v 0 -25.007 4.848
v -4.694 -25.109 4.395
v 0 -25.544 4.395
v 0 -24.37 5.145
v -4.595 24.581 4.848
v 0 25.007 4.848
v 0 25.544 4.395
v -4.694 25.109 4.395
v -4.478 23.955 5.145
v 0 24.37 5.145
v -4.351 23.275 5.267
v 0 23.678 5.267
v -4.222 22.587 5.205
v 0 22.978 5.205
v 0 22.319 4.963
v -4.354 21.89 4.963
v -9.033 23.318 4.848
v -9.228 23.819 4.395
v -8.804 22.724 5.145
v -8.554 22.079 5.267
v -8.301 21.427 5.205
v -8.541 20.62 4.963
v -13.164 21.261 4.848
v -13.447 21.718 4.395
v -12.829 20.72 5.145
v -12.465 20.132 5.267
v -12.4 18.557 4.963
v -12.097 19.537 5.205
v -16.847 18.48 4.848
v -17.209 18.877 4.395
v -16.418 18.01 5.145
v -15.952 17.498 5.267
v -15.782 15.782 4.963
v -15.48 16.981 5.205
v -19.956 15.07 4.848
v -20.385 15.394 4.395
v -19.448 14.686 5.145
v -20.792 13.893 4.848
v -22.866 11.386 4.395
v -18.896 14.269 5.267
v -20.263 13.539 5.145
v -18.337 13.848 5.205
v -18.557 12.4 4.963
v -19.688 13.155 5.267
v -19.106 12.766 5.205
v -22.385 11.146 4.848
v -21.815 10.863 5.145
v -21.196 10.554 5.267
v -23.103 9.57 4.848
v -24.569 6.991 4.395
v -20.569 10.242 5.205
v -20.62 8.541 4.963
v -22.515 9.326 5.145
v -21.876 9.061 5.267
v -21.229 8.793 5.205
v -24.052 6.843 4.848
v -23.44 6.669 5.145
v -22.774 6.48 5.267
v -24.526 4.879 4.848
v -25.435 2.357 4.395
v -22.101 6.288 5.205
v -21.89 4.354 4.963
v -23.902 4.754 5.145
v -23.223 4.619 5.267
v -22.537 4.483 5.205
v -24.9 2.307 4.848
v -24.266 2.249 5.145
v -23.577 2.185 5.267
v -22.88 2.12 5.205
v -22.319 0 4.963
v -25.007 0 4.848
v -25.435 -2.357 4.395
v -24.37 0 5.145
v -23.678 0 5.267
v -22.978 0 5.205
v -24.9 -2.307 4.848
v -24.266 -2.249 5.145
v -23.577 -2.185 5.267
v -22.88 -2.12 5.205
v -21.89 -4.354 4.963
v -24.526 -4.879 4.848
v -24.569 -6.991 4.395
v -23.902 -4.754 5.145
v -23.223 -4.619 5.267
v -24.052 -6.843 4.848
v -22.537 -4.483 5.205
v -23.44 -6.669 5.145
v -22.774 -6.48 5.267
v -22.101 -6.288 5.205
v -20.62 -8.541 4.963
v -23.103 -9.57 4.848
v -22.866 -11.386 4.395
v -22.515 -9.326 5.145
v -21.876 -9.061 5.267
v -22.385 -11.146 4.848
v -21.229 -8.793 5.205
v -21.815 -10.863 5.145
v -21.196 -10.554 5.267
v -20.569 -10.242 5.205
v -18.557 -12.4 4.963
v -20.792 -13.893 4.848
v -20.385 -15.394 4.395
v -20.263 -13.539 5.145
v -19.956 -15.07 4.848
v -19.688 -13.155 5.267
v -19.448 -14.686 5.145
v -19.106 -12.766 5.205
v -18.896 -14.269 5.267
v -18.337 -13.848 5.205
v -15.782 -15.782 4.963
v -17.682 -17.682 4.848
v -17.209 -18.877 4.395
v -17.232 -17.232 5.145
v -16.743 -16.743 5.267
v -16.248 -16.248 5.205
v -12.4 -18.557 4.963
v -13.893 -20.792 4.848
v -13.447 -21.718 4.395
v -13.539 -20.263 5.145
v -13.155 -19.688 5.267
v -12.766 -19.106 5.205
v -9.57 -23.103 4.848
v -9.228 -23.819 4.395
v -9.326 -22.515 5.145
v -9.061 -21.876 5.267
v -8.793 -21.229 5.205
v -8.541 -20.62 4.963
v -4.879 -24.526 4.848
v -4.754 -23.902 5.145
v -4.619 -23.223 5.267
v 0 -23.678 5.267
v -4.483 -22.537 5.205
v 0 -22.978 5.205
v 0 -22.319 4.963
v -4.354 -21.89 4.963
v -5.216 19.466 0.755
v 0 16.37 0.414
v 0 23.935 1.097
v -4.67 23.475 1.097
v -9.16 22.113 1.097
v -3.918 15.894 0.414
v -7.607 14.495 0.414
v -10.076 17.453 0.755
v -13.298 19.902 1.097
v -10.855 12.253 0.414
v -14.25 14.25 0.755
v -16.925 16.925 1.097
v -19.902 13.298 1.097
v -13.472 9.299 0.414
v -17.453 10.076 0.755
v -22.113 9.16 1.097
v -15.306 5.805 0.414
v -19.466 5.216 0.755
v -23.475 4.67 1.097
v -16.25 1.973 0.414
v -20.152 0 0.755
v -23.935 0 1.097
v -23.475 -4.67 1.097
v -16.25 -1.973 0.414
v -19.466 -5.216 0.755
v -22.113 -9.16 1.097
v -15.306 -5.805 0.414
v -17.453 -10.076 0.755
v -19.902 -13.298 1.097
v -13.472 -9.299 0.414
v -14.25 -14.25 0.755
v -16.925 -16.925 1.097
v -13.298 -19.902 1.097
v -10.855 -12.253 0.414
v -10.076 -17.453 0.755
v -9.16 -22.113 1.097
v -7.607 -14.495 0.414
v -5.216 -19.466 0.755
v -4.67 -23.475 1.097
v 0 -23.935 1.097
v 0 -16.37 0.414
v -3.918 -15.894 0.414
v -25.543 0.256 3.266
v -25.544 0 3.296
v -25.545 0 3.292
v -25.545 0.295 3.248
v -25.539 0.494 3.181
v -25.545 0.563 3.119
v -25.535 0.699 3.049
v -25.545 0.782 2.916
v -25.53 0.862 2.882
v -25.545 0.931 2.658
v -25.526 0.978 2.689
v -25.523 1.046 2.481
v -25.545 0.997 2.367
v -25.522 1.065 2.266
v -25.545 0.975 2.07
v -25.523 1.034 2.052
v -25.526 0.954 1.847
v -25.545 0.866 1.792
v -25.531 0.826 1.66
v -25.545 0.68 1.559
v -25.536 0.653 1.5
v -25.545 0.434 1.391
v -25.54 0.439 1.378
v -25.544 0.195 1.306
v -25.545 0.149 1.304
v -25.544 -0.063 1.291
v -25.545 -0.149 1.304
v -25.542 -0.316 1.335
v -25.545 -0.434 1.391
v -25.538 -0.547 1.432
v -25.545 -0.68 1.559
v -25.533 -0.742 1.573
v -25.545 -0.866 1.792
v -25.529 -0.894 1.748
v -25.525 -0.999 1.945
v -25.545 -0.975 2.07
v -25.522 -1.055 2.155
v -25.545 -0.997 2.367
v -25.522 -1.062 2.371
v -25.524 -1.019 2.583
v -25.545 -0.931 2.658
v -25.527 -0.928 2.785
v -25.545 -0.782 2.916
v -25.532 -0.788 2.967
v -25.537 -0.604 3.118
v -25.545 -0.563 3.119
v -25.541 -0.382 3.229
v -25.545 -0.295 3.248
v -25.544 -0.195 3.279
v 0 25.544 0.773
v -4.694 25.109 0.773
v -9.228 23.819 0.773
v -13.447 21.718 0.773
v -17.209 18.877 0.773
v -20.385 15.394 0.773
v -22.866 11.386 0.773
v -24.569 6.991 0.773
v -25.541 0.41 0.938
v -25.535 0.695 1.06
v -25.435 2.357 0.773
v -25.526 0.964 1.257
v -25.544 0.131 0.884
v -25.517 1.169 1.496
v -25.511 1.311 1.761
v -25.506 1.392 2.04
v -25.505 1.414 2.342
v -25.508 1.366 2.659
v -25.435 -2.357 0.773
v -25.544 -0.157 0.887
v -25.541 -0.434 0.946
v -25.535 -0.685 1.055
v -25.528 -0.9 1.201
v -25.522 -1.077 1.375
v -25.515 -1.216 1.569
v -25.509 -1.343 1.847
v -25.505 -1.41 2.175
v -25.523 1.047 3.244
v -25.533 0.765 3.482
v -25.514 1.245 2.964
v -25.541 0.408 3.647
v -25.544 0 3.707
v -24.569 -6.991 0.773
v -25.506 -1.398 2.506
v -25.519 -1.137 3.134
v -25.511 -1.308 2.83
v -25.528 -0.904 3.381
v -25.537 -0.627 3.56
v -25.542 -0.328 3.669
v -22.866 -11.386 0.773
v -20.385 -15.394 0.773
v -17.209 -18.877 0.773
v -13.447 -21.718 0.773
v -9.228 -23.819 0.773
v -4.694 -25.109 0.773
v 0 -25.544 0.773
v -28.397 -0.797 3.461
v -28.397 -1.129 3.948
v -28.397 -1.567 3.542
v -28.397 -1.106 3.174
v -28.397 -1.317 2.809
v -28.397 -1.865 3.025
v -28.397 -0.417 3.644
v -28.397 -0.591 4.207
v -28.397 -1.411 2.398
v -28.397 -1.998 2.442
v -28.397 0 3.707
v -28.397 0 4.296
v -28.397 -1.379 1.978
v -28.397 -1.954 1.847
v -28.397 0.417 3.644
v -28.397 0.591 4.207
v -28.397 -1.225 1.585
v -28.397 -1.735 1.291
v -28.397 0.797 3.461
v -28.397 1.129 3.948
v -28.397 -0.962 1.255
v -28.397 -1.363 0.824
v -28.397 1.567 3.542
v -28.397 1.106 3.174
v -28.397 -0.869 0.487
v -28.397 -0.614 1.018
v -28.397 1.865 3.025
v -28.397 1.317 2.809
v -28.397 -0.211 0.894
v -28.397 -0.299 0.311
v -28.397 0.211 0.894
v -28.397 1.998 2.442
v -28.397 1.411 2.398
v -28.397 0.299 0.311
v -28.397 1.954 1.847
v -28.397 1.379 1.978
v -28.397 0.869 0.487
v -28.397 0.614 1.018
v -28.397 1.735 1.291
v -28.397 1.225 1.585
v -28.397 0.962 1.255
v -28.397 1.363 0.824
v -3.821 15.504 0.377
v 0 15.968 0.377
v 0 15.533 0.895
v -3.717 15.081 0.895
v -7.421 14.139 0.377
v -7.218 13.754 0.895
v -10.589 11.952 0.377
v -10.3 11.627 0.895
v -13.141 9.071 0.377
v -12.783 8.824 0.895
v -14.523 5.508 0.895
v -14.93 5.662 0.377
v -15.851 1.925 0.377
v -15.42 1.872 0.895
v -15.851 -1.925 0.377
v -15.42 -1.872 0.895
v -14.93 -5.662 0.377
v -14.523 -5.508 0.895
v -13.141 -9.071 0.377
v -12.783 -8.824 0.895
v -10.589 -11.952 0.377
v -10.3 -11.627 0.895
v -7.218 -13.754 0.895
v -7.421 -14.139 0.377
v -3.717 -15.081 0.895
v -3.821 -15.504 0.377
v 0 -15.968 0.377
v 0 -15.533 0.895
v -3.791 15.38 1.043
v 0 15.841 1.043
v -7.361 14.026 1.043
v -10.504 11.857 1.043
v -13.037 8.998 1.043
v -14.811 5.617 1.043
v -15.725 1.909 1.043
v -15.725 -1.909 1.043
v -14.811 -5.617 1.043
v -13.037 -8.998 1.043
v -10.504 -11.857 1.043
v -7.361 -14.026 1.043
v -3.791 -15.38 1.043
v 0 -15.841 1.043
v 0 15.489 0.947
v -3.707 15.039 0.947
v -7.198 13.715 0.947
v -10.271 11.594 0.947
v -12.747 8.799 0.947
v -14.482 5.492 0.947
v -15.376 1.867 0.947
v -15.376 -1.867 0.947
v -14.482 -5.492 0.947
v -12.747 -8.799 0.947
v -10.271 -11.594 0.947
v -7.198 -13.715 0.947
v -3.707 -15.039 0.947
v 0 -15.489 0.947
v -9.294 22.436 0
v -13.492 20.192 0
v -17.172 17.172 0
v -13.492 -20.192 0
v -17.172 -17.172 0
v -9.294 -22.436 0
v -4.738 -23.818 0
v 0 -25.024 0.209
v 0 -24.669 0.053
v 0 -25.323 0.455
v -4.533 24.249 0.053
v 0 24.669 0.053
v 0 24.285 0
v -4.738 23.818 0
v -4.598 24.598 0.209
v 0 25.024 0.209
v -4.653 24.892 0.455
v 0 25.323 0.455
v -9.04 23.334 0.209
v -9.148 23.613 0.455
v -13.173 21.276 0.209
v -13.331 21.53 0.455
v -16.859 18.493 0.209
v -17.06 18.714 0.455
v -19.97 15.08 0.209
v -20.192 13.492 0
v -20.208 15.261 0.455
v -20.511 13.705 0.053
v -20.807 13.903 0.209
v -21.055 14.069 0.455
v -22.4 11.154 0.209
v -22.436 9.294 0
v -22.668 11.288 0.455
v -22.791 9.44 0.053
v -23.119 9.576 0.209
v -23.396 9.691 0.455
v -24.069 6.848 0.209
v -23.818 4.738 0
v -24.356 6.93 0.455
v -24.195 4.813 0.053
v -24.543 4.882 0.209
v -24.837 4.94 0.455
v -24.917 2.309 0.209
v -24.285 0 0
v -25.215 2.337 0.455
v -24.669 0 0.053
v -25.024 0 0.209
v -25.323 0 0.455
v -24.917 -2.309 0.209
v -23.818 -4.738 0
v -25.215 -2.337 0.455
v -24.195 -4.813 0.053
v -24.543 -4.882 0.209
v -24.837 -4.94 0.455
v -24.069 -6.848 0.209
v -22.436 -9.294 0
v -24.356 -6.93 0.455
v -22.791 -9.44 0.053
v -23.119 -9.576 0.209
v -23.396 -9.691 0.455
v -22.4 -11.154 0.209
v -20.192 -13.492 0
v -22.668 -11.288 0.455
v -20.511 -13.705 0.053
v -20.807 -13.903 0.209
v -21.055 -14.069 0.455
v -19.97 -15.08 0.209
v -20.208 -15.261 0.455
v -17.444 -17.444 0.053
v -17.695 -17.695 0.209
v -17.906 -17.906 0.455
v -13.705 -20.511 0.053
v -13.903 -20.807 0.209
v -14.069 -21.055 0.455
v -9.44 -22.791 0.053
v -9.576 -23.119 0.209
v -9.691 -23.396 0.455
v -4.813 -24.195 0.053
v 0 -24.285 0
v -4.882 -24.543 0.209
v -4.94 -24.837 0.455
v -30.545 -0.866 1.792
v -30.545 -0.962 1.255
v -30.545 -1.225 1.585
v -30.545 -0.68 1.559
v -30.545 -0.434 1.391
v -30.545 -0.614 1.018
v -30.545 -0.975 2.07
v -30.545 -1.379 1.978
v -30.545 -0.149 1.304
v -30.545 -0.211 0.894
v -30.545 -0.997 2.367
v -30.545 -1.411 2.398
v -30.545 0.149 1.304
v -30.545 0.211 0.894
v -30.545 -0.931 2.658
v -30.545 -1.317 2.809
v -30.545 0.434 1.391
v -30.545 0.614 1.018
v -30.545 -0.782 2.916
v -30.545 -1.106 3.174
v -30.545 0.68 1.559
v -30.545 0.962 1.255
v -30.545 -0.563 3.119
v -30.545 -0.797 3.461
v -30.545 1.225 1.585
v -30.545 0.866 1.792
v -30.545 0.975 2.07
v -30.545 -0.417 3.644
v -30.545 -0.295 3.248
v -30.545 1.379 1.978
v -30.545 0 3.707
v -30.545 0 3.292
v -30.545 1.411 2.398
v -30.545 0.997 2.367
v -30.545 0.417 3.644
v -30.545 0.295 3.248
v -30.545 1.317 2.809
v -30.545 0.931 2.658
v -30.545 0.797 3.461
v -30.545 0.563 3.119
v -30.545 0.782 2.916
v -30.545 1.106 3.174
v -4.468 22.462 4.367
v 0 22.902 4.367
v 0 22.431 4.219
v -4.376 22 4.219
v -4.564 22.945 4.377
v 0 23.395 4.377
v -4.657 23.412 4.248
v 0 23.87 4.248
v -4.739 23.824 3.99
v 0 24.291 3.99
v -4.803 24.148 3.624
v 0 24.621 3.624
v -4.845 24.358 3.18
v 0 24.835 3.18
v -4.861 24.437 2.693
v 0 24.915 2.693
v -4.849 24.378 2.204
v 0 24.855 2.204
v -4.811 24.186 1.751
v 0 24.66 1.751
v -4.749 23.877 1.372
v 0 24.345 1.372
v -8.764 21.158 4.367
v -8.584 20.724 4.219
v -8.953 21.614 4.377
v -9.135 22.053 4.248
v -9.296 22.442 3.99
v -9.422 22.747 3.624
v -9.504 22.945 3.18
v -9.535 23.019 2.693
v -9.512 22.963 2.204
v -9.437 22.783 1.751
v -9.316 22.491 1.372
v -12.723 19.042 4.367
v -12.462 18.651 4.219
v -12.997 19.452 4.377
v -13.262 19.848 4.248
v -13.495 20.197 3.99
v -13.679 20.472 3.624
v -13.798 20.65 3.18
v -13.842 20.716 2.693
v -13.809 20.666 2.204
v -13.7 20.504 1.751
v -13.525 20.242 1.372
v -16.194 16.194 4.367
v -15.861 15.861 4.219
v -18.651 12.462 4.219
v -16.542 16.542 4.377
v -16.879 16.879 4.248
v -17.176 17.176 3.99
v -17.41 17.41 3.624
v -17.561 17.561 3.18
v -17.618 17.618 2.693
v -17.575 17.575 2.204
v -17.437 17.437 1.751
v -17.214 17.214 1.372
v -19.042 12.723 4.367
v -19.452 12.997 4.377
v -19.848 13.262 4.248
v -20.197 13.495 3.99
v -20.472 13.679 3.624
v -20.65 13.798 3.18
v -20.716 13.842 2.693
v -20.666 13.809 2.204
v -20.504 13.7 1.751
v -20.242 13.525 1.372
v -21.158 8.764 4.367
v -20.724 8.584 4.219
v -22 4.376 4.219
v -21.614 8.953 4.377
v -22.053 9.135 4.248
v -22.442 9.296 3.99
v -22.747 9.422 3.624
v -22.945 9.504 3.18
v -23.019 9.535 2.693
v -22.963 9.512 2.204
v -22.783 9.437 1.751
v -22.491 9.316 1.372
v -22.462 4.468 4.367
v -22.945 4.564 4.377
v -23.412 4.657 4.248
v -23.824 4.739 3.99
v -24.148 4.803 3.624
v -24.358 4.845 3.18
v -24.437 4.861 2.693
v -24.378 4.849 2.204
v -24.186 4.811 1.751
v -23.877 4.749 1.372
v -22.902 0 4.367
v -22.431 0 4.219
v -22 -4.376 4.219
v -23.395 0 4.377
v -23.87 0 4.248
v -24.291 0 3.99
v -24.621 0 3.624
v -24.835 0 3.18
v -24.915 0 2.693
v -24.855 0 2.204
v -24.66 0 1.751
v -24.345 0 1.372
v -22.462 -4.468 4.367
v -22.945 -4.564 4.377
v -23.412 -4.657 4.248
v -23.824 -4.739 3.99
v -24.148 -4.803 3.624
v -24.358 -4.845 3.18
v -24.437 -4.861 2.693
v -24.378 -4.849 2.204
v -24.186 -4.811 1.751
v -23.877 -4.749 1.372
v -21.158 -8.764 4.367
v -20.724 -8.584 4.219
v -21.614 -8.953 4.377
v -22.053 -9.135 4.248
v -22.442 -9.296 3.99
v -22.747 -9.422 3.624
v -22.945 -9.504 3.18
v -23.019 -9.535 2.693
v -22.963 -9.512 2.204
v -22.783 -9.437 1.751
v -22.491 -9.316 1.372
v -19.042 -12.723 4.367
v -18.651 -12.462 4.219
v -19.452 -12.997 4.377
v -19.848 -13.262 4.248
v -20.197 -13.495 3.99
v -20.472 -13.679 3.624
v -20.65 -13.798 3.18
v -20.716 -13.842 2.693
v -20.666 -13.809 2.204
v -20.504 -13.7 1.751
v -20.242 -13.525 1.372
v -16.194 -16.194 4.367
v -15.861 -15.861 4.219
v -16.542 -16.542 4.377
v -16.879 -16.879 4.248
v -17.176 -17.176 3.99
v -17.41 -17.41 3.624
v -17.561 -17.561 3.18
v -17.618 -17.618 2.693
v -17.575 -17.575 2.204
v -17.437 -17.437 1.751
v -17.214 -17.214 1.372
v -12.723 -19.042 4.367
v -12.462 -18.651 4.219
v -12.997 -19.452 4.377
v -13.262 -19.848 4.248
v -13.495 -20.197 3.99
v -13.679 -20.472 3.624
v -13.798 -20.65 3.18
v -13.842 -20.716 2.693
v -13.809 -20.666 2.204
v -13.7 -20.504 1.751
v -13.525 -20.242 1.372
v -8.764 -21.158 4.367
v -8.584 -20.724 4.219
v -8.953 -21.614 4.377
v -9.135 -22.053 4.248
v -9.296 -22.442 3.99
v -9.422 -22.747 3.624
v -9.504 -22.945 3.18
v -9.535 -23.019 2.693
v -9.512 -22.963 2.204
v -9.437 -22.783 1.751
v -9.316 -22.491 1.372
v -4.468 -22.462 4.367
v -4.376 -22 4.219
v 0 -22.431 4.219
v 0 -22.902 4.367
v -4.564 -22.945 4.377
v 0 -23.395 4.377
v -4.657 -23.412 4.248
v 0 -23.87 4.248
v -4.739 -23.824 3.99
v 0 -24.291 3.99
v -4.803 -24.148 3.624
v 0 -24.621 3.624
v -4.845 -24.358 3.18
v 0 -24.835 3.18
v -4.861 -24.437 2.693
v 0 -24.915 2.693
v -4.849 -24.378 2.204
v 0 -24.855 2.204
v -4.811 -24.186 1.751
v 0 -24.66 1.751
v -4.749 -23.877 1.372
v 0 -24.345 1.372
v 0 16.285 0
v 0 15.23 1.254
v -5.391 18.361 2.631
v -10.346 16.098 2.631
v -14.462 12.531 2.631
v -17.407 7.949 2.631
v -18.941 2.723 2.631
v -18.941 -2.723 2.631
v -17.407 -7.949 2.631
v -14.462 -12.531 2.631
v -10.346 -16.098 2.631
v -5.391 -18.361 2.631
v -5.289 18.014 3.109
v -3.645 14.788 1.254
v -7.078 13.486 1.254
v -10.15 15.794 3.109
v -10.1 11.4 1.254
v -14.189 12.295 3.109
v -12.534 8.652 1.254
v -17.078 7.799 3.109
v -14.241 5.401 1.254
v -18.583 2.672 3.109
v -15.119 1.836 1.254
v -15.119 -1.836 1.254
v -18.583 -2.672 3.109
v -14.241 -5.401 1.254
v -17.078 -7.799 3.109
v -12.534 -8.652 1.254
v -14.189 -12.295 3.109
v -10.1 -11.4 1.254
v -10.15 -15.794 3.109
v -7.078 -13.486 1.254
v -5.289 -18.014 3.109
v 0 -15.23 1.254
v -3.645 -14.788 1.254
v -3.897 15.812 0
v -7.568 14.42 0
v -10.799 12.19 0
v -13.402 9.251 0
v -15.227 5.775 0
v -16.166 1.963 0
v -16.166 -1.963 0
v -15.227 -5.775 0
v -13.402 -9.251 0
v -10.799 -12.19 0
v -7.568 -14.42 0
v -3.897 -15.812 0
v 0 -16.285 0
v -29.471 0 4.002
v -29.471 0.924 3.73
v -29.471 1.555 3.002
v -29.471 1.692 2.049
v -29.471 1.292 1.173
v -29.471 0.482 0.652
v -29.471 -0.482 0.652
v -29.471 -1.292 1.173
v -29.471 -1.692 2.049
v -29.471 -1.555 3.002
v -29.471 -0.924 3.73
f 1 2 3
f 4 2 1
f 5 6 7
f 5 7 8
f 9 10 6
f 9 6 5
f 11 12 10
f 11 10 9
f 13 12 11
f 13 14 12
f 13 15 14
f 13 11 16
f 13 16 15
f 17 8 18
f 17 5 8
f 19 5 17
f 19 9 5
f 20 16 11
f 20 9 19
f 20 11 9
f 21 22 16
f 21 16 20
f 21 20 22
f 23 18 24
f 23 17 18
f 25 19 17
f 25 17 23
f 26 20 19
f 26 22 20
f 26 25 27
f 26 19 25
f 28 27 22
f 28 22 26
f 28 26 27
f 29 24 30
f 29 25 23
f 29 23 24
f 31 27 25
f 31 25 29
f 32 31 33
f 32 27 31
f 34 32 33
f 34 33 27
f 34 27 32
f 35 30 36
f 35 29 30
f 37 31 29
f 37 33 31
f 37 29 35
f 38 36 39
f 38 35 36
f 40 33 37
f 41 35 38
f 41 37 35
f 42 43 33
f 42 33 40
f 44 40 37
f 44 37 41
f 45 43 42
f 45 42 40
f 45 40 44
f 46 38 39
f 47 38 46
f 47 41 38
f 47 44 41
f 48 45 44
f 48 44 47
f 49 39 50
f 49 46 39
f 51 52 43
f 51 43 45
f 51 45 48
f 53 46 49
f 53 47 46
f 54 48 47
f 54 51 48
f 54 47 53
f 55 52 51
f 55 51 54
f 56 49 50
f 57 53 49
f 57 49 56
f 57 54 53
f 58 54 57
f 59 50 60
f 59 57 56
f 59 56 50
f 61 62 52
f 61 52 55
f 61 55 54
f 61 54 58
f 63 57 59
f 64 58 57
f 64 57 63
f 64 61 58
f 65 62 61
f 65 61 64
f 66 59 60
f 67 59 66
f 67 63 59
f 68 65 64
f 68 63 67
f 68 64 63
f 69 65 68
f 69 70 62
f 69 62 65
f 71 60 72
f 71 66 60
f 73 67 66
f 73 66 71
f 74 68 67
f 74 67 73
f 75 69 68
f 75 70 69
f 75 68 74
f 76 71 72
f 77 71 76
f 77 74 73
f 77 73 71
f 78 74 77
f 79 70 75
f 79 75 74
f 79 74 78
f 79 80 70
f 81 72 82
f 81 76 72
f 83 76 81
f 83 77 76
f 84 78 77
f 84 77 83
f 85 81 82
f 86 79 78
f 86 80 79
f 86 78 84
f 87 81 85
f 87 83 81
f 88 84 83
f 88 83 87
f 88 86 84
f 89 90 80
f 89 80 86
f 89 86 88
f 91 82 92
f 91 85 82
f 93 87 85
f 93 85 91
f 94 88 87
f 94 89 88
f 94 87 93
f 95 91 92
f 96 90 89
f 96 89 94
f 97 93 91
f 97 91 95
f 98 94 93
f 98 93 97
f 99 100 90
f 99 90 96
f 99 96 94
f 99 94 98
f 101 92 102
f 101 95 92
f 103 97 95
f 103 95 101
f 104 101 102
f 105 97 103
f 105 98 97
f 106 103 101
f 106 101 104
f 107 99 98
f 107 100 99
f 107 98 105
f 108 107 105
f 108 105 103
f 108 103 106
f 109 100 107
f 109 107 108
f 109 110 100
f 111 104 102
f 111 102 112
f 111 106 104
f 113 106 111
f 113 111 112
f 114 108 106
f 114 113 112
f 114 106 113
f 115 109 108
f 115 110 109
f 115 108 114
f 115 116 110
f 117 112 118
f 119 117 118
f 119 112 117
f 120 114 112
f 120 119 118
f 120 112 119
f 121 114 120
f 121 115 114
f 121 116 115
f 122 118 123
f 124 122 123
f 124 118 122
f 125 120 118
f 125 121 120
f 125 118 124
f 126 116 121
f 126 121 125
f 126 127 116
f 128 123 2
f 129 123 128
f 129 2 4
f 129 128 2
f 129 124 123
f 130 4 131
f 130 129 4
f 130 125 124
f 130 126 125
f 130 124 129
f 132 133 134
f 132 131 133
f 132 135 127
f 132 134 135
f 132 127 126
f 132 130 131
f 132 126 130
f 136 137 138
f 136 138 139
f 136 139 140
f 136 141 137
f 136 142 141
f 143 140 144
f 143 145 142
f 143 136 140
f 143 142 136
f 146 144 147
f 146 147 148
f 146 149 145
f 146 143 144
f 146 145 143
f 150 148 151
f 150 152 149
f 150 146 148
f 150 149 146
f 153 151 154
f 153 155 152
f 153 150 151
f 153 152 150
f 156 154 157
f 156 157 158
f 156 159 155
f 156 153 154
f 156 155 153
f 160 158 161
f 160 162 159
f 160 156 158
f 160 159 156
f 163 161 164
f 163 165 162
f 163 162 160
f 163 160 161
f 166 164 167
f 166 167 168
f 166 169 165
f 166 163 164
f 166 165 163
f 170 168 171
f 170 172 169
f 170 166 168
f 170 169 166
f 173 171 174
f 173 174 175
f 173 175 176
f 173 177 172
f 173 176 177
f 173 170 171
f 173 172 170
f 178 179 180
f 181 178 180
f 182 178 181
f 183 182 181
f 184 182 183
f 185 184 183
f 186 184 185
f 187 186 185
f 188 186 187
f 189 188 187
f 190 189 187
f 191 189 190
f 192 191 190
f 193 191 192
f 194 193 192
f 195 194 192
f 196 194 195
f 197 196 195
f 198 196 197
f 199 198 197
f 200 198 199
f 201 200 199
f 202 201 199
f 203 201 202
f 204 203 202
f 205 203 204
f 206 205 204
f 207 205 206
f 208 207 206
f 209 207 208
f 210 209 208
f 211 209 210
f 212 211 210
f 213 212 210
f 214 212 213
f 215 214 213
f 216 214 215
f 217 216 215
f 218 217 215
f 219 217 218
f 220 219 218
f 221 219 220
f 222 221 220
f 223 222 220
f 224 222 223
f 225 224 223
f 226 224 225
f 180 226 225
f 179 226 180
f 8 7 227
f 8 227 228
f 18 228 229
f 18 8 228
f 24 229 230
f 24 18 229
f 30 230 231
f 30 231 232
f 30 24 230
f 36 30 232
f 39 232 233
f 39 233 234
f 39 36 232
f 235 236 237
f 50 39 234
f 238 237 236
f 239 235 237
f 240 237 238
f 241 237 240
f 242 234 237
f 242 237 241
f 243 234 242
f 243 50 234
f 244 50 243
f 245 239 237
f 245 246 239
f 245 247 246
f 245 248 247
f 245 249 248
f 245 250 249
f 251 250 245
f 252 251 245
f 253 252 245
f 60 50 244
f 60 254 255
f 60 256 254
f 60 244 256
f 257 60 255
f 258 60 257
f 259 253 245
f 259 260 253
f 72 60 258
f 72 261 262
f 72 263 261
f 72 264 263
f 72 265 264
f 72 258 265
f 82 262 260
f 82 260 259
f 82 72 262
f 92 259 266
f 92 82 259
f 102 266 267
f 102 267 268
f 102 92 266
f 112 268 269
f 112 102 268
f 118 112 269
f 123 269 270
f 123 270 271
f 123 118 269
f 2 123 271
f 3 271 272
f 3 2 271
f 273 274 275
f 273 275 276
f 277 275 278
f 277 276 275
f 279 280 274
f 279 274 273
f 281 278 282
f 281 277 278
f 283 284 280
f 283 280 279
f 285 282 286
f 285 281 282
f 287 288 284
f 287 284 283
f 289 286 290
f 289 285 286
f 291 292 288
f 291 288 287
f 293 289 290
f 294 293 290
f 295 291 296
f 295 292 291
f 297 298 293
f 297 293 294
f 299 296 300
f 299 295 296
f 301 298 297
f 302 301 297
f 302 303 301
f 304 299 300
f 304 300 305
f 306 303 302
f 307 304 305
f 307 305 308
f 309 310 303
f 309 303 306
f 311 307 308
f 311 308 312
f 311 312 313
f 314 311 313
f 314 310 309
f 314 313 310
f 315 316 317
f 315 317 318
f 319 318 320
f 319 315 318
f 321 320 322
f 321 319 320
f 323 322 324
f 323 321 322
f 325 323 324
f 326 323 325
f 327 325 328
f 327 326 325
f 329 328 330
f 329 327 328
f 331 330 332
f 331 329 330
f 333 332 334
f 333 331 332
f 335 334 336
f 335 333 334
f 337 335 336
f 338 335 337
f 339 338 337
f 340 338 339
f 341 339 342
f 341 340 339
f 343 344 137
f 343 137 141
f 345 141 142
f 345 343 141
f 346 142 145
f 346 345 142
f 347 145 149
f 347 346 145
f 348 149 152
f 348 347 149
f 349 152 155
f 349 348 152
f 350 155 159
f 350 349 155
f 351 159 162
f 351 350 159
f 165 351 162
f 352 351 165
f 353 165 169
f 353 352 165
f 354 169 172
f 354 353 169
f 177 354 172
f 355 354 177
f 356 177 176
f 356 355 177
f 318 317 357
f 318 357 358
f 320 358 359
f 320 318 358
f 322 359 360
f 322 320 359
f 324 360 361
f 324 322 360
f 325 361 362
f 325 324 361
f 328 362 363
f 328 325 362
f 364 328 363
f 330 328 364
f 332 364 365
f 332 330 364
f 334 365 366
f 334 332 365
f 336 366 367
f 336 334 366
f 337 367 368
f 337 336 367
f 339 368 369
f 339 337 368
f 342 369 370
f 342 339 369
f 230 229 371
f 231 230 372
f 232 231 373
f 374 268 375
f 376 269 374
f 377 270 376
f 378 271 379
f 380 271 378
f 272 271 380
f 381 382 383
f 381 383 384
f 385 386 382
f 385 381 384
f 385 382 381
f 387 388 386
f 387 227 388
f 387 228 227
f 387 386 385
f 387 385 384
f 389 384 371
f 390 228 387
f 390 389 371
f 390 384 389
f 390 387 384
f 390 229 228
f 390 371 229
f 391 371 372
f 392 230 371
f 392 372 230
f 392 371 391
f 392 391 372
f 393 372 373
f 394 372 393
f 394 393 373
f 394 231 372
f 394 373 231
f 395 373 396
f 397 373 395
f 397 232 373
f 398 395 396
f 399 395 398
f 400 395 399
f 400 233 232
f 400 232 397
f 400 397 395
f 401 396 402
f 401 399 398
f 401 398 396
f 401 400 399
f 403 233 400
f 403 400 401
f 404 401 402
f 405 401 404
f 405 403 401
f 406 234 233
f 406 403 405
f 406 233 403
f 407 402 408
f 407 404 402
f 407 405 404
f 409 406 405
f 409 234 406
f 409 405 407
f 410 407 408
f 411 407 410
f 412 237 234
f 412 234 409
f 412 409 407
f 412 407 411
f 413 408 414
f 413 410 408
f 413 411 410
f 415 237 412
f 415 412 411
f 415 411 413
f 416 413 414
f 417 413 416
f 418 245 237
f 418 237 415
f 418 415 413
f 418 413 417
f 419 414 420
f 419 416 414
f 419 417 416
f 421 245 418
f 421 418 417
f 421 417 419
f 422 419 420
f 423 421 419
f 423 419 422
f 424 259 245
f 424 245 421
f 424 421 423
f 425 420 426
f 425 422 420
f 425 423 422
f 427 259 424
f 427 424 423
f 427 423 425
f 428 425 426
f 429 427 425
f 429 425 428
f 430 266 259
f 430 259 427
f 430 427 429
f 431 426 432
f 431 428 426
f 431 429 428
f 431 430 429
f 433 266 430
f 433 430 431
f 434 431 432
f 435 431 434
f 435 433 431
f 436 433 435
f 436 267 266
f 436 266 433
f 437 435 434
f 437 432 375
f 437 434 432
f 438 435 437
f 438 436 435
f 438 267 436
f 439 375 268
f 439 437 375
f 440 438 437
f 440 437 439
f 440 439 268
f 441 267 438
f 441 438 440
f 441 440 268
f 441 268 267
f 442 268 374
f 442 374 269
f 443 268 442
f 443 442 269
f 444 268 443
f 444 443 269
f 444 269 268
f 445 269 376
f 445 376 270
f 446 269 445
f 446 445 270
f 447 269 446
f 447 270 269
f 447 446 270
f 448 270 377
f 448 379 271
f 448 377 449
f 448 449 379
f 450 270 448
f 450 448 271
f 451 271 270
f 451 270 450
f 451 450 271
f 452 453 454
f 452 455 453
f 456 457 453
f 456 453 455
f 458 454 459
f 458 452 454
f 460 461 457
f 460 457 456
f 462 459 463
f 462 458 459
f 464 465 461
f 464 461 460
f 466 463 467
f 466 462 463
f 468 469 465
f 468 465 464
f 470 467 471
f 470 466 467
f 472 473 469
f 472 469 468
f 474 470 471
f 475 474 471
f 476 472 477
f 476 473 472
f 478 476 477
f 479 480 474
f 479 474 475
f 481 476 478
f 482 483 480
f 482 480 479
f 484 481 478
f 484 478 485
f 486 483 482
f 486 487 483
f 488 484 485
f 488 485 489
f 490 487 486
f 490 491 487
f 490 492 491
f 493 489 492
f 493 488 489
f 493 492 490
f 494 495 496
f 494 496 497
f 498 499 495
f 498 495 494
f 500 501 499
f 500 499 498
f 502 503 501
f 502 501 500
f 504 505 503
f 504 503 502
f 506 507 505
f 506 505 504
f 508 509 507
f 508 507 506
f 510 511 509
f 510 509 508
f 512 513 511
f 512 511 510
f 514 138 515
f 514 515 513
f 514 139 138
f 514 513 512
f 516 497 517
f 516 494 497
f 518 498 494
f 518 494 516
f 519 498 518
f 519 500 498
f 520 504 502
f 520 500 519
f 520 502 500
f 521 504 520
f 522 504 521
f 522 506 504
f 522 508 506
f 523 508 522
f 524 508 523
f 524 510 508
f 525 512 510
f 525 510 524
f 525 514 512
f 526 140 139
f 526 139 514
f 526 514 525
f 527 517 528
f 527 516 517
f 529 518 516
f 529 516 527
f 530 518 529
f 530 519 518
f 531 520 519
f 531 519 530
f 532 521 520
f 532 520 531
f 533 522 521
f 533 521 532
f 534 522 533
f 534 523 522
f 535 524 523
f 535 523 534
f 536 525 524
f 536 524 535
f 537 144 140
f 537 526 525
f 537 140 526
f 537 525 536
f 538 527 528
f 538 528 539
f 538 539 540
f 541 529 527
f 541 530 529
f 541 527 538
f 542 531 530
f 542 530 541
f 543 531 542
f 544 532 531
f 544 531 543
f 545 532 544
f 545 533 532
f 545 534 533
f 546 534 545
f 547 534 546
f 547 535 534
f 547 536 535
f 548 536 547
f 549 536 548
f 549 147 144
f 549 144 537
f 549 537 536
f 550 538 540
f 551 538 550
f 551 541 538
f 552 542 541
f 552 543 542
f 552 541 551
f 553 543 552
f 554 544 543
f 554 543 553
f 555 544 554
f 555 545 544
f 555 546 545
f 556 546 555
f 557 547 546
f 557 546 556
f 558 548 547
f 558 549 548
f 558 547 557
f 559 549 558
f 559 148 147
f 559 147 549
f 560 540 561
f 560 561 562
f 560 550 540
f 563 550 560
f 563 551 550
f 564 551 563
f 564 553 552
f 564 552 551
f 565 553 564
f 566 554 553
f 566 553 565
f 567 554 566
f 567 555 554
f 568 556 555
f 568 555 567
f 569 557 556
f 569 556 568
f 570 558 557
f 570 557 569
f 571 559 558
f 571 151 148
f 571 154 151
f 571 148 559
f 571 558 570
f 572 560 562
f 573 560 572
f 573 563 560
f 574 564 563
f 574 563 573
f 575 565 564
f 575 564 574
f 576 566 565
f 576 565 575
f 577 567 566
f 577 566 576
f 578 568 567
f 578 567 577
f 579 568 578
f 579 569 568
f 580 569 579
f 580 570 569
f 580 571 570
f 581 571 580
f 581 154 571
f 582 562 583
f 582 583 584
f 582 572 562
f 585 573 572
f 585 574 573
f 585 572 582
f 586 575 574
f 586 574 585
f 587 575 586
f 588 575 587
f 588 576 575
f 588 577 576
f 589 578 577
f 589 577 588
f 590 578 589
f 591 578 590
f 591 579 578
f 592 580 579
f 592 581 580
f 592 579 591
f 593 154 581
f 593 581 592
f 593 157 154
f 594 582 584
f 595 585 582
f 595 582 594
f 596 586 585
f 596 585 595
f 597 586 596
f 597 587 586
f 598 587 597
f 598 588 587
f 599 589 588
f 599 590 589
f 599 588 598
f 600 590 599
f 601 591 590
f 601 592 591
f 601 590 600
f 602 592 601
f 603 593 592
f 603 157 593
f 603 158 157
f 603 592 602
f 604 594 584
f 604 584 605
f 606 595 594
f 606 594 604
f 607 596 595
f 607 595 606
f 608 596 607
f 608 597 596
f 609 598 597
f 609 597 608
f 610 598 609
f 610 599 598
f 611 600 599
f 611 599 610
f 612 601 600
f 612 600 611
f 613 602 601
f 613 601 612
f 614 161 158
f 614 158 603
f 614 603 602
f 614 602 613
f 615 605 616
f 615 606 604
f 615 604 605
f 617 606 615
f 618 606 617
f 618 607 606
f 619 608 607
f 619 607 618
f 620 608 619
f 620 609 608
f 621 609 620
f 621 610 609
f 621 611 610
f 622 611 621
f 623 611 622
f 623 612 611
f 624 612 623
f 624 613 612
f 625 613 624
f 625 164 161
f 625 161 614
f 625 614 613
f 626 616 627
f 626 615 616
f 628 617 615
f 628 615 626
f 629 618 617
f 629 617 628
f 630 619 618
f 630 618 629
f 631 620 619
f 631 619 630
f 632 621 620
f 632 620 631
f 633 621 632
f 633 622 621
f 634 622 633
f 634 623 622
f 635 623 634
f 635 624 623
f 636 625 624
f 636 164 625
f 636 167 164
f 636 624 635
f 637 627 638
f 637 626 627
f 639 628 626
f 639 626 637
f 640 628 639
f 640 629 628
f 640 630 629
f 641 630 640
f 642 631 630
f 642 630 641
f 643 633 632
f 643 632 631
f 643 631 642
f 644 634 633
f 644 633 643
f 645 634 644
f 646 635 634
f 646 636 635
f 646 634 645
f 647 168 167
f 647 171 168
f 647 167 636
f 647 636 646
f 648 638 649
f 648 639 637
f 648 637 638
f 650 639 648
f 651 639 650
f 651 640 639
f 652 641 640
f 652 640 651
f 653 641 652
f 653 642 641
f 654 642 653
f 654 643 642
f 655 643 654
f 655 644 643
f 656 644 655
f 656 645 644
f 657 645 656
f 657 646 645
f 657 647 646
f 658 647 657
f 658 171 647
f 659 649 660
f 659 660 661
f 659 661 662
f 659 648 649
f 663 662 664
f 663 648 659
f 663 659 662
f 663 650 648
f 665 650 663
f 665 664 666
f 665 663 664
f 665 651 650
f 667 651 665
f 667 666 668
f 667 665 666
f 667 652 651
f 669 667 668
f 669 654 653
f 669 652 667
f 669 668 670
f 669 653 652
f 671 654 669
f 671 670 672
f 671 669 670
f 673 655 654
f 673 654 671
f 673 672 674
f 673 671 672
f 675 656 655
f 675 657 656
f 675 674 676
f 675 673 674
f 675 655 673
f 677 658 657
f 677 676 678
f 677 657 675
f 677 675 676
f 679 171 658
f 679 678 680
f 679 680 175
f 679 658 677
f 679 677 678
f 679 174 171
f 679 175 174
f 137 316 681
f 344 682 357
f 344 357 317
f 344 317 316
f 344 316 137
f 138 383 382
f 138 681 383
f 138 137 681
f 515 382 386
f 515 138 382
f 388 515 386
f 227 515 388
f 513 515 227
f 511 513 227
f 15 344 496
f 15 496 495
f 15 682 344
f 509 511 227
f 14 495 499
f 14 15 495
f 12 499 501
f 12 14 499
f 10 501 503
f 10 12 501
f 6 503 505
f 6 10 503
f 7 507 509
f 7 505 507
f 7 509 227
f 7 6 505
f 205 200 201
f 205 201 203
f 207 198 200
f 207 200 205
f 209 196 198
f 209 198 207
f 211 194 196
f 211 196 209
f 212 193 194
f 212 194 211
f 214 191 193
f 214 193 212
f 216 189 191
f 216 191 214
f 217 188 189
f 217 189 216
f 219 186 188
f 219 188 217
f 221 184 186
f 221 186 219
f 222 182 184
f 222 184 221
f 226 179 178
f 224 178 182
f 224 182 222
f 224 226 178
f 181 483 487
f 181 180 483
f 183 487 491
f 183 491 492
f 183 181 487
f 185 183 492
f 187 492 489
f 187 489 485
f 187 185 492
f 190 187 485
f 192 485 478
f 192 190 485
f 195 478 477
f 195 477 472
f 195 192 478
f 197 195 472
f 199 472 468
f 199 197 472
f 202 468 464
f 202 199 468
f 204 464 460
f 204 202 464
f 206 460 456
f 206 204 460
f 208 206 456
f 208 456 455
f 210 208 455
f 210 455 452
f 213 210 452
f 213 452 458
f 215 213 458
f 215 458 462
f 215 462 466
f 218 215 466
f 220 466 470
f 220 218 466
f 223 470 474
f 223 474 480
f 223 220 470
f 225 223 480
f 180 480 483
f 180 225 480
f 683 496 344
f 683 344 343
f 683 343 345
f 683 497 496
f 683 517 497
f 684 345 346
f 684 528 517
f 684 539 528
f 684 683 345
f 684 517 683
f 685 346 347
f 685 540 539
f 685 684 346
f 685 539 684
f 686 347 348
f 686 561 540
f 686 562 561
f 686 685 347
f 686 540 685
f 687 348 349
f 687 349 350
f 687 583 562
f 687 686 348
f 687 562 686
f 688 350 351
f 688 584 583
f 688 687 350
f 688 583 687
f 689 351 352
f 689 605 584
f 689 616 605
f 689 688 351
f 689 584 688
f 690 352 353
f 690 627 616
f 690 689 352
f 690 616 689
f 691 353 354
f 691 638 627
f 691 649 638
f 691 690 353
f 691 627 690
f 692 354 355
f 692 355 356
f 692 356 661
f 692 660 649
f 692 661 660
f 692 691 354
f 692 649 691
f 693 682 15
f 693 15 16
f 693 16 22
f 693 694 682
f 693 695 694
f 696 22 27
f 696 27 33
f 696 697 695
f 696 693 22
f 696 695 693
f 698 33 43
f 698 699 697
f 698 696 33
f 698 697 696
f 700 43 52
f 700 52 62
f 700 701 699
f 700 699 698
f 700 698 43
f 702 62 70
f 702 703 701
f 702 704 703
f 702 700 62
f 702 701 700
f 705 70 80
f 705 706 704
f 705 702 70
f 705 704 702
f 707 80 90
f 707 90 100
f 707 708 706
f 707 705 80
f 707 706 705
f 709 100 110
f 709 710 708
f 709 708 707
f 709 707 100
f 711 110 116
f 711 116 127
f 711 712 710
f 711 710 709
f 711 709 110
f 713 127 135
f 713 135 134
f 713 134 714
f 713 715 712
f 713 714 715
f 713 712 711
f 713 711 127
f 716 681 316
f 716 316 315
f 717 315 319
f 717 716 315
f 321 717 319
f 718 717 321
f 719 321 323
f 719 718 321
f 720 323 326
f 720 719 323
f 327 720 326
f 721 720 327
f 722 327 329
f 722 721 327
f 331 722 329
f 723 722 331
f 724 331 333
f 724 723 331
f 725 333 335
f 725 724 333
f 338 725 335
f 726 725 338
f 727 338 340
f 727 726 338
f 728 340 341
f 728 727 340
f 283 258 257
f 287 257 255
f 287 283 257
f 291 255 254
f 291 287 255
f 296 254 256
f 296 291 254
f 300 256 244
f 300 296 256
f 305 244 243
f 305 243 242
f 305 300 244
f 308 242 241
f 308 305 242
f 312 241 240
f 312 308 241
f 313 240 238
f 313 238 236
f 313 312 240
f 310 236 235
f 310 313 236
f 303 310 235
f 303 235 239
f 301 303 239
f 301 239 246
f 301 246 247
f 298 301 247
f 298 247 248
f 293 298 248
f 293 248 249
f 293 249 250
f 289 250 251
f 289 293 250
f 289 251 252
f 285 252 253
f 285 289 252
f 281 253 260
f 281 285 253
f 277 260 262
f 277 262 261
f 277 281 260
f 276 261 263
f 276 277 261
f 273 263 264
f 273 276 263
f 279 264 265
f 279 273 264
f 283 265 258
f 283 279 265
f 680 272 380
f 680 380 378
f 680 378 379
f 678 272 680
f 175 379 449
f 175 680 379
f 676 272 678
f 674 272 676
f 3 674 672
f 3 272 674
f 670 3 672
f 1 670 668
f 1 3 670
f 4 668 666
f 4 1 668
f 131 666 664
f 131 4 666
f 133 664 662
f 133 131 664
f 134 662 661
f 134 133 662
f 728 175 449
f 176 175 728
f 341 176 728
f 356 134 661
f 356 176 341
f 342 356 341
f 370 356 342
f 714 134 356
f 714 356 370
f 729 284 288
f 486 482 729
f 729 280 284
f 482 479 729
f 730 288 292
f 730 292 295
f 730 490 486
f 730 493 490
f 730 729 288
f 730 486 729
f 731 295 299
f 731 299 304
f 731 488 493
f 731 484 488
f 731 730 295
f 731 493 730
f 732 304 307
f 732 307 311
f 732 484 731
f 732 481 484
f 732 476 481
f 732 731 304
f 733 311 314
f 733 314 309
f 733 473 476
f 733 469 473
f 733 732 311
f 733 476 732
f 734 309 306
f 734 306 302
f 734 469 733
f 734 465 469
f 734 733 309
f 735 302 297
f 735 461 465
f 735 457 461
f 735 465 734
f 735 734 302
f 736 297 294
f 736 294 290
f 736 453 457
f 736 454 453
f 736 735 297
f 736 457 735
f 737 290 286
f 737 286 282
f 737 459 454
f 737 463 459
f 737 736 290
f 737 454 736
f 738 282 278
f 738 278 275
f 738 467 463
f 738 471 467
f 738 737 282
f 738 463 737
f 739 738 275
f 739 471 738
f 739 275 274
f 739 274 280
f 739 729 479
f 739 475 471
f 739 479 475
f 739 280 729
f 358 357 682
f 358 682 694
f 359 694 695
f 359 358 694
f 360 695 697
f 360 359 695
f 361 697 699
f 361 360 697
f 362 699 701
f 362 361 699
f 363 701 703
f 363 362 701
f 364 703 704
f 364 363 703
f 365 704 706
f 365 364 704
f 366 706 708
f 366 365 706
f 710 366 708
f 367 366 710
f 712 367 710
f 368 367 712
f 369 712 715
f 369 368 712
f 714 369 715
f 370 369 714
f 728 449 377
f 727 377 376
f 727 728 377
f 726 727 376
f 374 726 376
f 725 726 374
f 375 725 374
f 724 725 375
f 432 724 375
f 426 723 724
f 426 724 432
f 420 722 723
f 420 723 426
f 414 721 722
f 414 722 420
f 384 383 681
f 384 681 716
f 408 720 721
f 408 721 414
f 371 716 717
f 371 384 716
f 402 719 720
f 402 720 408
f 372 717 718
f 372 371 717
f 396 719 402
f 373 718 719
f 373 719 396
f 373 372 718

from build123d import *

# Parameters (mm, degrees)
F4_W     = 51.4225922525
F4_H     = 7.856229553
F5_DEPTH = 26


# Not quite as in the source:
# - a feature names something its author has since deleted; it is built from what else it names


with BuildPart() as f1:
    # F0 (on Front) → F1 (revolve)
    with BuildSketch(Plane.XZ):
        with BuildLine():
            Line((22.3186584817, 4.9634656969), (15.2303930372, 1.2544910423))
            Line((15.2303930372, 1.2544910423), (15.488850391, 0.9470738952))
            Line((15.488850391, 0.9470738952), (15.5328564546, 0.894731726))
            Line((15.5328564546, 0.894731726), (15.8405525238, 1.0429841968))
            Line((15.8405525238, 1.0429841968), (22.4313864066, 4.2185444515))
            ThreePointArc((22.4313864066, 4.2185444515), (24.744105662, 3.4097946744), (23.9353558848, 1.097075419))
            Line((23.9353558848, 1.097075419), (16.3696151821, 0.4137007552))
            Line((16.3696151821, 0.4137007552), (15.9677918852, 0.3774061119))
            Line((15.9677918852, 0.3774061119), (16.2850916386, 0))
            Line((16.2850916386, 0), (24.2850916386, 0))
            ThreePointArc((24.2850916386, 0), (25.023915829, 0.2087553322), (25.5442474517, 0.7732860891))
            Line((25.5442474517, 0.7732860891), (25.5442474517, 4.3952541752))
            ThreePointArc((25.5442474517, 4.3952541752), (24.028202675, 5.2285828576), (22.3186584817, 4.9634656969))
        make_face()
        Polygon((15.8405525238, 1.0429841968), (15.5328564546, 0.894731726), (15.9677918852, 0.3774061119), (16.3696151821, 0.4137007552), align=None)
    revolve(axis=Axis((0, 0, 1.8443568842), (0, 0, 1)))

    # F2 (on Front) → F3 (revolve)
    with BuildSketch(Plane.XZ):
        Polygon((-25.3970567137, 3.7070766557), (-28.3970567137, 3.7070766557), (-28.3970567137, 4.2962685693), (-30.5454257131, 3.7070766557), (-30.5454257131, 3.2924627885), (-25.5454257131, 3.2924627885), align=None)
    revolve(axis=Axis((-26.2971473858, 0, 2.2924627885), (-1, 0, 0)))

    # F4 (on Right) → F5 (cut)
    with BuildSketch(Plane.YZ):
        with Locations((-0.0007599592, 2.6581416605)):
            Rectangle(F4_W, F4_H)
    extrude(amount=F5_DEPTH, mode=Mode.SUBTRACT)


solid = f1.part
